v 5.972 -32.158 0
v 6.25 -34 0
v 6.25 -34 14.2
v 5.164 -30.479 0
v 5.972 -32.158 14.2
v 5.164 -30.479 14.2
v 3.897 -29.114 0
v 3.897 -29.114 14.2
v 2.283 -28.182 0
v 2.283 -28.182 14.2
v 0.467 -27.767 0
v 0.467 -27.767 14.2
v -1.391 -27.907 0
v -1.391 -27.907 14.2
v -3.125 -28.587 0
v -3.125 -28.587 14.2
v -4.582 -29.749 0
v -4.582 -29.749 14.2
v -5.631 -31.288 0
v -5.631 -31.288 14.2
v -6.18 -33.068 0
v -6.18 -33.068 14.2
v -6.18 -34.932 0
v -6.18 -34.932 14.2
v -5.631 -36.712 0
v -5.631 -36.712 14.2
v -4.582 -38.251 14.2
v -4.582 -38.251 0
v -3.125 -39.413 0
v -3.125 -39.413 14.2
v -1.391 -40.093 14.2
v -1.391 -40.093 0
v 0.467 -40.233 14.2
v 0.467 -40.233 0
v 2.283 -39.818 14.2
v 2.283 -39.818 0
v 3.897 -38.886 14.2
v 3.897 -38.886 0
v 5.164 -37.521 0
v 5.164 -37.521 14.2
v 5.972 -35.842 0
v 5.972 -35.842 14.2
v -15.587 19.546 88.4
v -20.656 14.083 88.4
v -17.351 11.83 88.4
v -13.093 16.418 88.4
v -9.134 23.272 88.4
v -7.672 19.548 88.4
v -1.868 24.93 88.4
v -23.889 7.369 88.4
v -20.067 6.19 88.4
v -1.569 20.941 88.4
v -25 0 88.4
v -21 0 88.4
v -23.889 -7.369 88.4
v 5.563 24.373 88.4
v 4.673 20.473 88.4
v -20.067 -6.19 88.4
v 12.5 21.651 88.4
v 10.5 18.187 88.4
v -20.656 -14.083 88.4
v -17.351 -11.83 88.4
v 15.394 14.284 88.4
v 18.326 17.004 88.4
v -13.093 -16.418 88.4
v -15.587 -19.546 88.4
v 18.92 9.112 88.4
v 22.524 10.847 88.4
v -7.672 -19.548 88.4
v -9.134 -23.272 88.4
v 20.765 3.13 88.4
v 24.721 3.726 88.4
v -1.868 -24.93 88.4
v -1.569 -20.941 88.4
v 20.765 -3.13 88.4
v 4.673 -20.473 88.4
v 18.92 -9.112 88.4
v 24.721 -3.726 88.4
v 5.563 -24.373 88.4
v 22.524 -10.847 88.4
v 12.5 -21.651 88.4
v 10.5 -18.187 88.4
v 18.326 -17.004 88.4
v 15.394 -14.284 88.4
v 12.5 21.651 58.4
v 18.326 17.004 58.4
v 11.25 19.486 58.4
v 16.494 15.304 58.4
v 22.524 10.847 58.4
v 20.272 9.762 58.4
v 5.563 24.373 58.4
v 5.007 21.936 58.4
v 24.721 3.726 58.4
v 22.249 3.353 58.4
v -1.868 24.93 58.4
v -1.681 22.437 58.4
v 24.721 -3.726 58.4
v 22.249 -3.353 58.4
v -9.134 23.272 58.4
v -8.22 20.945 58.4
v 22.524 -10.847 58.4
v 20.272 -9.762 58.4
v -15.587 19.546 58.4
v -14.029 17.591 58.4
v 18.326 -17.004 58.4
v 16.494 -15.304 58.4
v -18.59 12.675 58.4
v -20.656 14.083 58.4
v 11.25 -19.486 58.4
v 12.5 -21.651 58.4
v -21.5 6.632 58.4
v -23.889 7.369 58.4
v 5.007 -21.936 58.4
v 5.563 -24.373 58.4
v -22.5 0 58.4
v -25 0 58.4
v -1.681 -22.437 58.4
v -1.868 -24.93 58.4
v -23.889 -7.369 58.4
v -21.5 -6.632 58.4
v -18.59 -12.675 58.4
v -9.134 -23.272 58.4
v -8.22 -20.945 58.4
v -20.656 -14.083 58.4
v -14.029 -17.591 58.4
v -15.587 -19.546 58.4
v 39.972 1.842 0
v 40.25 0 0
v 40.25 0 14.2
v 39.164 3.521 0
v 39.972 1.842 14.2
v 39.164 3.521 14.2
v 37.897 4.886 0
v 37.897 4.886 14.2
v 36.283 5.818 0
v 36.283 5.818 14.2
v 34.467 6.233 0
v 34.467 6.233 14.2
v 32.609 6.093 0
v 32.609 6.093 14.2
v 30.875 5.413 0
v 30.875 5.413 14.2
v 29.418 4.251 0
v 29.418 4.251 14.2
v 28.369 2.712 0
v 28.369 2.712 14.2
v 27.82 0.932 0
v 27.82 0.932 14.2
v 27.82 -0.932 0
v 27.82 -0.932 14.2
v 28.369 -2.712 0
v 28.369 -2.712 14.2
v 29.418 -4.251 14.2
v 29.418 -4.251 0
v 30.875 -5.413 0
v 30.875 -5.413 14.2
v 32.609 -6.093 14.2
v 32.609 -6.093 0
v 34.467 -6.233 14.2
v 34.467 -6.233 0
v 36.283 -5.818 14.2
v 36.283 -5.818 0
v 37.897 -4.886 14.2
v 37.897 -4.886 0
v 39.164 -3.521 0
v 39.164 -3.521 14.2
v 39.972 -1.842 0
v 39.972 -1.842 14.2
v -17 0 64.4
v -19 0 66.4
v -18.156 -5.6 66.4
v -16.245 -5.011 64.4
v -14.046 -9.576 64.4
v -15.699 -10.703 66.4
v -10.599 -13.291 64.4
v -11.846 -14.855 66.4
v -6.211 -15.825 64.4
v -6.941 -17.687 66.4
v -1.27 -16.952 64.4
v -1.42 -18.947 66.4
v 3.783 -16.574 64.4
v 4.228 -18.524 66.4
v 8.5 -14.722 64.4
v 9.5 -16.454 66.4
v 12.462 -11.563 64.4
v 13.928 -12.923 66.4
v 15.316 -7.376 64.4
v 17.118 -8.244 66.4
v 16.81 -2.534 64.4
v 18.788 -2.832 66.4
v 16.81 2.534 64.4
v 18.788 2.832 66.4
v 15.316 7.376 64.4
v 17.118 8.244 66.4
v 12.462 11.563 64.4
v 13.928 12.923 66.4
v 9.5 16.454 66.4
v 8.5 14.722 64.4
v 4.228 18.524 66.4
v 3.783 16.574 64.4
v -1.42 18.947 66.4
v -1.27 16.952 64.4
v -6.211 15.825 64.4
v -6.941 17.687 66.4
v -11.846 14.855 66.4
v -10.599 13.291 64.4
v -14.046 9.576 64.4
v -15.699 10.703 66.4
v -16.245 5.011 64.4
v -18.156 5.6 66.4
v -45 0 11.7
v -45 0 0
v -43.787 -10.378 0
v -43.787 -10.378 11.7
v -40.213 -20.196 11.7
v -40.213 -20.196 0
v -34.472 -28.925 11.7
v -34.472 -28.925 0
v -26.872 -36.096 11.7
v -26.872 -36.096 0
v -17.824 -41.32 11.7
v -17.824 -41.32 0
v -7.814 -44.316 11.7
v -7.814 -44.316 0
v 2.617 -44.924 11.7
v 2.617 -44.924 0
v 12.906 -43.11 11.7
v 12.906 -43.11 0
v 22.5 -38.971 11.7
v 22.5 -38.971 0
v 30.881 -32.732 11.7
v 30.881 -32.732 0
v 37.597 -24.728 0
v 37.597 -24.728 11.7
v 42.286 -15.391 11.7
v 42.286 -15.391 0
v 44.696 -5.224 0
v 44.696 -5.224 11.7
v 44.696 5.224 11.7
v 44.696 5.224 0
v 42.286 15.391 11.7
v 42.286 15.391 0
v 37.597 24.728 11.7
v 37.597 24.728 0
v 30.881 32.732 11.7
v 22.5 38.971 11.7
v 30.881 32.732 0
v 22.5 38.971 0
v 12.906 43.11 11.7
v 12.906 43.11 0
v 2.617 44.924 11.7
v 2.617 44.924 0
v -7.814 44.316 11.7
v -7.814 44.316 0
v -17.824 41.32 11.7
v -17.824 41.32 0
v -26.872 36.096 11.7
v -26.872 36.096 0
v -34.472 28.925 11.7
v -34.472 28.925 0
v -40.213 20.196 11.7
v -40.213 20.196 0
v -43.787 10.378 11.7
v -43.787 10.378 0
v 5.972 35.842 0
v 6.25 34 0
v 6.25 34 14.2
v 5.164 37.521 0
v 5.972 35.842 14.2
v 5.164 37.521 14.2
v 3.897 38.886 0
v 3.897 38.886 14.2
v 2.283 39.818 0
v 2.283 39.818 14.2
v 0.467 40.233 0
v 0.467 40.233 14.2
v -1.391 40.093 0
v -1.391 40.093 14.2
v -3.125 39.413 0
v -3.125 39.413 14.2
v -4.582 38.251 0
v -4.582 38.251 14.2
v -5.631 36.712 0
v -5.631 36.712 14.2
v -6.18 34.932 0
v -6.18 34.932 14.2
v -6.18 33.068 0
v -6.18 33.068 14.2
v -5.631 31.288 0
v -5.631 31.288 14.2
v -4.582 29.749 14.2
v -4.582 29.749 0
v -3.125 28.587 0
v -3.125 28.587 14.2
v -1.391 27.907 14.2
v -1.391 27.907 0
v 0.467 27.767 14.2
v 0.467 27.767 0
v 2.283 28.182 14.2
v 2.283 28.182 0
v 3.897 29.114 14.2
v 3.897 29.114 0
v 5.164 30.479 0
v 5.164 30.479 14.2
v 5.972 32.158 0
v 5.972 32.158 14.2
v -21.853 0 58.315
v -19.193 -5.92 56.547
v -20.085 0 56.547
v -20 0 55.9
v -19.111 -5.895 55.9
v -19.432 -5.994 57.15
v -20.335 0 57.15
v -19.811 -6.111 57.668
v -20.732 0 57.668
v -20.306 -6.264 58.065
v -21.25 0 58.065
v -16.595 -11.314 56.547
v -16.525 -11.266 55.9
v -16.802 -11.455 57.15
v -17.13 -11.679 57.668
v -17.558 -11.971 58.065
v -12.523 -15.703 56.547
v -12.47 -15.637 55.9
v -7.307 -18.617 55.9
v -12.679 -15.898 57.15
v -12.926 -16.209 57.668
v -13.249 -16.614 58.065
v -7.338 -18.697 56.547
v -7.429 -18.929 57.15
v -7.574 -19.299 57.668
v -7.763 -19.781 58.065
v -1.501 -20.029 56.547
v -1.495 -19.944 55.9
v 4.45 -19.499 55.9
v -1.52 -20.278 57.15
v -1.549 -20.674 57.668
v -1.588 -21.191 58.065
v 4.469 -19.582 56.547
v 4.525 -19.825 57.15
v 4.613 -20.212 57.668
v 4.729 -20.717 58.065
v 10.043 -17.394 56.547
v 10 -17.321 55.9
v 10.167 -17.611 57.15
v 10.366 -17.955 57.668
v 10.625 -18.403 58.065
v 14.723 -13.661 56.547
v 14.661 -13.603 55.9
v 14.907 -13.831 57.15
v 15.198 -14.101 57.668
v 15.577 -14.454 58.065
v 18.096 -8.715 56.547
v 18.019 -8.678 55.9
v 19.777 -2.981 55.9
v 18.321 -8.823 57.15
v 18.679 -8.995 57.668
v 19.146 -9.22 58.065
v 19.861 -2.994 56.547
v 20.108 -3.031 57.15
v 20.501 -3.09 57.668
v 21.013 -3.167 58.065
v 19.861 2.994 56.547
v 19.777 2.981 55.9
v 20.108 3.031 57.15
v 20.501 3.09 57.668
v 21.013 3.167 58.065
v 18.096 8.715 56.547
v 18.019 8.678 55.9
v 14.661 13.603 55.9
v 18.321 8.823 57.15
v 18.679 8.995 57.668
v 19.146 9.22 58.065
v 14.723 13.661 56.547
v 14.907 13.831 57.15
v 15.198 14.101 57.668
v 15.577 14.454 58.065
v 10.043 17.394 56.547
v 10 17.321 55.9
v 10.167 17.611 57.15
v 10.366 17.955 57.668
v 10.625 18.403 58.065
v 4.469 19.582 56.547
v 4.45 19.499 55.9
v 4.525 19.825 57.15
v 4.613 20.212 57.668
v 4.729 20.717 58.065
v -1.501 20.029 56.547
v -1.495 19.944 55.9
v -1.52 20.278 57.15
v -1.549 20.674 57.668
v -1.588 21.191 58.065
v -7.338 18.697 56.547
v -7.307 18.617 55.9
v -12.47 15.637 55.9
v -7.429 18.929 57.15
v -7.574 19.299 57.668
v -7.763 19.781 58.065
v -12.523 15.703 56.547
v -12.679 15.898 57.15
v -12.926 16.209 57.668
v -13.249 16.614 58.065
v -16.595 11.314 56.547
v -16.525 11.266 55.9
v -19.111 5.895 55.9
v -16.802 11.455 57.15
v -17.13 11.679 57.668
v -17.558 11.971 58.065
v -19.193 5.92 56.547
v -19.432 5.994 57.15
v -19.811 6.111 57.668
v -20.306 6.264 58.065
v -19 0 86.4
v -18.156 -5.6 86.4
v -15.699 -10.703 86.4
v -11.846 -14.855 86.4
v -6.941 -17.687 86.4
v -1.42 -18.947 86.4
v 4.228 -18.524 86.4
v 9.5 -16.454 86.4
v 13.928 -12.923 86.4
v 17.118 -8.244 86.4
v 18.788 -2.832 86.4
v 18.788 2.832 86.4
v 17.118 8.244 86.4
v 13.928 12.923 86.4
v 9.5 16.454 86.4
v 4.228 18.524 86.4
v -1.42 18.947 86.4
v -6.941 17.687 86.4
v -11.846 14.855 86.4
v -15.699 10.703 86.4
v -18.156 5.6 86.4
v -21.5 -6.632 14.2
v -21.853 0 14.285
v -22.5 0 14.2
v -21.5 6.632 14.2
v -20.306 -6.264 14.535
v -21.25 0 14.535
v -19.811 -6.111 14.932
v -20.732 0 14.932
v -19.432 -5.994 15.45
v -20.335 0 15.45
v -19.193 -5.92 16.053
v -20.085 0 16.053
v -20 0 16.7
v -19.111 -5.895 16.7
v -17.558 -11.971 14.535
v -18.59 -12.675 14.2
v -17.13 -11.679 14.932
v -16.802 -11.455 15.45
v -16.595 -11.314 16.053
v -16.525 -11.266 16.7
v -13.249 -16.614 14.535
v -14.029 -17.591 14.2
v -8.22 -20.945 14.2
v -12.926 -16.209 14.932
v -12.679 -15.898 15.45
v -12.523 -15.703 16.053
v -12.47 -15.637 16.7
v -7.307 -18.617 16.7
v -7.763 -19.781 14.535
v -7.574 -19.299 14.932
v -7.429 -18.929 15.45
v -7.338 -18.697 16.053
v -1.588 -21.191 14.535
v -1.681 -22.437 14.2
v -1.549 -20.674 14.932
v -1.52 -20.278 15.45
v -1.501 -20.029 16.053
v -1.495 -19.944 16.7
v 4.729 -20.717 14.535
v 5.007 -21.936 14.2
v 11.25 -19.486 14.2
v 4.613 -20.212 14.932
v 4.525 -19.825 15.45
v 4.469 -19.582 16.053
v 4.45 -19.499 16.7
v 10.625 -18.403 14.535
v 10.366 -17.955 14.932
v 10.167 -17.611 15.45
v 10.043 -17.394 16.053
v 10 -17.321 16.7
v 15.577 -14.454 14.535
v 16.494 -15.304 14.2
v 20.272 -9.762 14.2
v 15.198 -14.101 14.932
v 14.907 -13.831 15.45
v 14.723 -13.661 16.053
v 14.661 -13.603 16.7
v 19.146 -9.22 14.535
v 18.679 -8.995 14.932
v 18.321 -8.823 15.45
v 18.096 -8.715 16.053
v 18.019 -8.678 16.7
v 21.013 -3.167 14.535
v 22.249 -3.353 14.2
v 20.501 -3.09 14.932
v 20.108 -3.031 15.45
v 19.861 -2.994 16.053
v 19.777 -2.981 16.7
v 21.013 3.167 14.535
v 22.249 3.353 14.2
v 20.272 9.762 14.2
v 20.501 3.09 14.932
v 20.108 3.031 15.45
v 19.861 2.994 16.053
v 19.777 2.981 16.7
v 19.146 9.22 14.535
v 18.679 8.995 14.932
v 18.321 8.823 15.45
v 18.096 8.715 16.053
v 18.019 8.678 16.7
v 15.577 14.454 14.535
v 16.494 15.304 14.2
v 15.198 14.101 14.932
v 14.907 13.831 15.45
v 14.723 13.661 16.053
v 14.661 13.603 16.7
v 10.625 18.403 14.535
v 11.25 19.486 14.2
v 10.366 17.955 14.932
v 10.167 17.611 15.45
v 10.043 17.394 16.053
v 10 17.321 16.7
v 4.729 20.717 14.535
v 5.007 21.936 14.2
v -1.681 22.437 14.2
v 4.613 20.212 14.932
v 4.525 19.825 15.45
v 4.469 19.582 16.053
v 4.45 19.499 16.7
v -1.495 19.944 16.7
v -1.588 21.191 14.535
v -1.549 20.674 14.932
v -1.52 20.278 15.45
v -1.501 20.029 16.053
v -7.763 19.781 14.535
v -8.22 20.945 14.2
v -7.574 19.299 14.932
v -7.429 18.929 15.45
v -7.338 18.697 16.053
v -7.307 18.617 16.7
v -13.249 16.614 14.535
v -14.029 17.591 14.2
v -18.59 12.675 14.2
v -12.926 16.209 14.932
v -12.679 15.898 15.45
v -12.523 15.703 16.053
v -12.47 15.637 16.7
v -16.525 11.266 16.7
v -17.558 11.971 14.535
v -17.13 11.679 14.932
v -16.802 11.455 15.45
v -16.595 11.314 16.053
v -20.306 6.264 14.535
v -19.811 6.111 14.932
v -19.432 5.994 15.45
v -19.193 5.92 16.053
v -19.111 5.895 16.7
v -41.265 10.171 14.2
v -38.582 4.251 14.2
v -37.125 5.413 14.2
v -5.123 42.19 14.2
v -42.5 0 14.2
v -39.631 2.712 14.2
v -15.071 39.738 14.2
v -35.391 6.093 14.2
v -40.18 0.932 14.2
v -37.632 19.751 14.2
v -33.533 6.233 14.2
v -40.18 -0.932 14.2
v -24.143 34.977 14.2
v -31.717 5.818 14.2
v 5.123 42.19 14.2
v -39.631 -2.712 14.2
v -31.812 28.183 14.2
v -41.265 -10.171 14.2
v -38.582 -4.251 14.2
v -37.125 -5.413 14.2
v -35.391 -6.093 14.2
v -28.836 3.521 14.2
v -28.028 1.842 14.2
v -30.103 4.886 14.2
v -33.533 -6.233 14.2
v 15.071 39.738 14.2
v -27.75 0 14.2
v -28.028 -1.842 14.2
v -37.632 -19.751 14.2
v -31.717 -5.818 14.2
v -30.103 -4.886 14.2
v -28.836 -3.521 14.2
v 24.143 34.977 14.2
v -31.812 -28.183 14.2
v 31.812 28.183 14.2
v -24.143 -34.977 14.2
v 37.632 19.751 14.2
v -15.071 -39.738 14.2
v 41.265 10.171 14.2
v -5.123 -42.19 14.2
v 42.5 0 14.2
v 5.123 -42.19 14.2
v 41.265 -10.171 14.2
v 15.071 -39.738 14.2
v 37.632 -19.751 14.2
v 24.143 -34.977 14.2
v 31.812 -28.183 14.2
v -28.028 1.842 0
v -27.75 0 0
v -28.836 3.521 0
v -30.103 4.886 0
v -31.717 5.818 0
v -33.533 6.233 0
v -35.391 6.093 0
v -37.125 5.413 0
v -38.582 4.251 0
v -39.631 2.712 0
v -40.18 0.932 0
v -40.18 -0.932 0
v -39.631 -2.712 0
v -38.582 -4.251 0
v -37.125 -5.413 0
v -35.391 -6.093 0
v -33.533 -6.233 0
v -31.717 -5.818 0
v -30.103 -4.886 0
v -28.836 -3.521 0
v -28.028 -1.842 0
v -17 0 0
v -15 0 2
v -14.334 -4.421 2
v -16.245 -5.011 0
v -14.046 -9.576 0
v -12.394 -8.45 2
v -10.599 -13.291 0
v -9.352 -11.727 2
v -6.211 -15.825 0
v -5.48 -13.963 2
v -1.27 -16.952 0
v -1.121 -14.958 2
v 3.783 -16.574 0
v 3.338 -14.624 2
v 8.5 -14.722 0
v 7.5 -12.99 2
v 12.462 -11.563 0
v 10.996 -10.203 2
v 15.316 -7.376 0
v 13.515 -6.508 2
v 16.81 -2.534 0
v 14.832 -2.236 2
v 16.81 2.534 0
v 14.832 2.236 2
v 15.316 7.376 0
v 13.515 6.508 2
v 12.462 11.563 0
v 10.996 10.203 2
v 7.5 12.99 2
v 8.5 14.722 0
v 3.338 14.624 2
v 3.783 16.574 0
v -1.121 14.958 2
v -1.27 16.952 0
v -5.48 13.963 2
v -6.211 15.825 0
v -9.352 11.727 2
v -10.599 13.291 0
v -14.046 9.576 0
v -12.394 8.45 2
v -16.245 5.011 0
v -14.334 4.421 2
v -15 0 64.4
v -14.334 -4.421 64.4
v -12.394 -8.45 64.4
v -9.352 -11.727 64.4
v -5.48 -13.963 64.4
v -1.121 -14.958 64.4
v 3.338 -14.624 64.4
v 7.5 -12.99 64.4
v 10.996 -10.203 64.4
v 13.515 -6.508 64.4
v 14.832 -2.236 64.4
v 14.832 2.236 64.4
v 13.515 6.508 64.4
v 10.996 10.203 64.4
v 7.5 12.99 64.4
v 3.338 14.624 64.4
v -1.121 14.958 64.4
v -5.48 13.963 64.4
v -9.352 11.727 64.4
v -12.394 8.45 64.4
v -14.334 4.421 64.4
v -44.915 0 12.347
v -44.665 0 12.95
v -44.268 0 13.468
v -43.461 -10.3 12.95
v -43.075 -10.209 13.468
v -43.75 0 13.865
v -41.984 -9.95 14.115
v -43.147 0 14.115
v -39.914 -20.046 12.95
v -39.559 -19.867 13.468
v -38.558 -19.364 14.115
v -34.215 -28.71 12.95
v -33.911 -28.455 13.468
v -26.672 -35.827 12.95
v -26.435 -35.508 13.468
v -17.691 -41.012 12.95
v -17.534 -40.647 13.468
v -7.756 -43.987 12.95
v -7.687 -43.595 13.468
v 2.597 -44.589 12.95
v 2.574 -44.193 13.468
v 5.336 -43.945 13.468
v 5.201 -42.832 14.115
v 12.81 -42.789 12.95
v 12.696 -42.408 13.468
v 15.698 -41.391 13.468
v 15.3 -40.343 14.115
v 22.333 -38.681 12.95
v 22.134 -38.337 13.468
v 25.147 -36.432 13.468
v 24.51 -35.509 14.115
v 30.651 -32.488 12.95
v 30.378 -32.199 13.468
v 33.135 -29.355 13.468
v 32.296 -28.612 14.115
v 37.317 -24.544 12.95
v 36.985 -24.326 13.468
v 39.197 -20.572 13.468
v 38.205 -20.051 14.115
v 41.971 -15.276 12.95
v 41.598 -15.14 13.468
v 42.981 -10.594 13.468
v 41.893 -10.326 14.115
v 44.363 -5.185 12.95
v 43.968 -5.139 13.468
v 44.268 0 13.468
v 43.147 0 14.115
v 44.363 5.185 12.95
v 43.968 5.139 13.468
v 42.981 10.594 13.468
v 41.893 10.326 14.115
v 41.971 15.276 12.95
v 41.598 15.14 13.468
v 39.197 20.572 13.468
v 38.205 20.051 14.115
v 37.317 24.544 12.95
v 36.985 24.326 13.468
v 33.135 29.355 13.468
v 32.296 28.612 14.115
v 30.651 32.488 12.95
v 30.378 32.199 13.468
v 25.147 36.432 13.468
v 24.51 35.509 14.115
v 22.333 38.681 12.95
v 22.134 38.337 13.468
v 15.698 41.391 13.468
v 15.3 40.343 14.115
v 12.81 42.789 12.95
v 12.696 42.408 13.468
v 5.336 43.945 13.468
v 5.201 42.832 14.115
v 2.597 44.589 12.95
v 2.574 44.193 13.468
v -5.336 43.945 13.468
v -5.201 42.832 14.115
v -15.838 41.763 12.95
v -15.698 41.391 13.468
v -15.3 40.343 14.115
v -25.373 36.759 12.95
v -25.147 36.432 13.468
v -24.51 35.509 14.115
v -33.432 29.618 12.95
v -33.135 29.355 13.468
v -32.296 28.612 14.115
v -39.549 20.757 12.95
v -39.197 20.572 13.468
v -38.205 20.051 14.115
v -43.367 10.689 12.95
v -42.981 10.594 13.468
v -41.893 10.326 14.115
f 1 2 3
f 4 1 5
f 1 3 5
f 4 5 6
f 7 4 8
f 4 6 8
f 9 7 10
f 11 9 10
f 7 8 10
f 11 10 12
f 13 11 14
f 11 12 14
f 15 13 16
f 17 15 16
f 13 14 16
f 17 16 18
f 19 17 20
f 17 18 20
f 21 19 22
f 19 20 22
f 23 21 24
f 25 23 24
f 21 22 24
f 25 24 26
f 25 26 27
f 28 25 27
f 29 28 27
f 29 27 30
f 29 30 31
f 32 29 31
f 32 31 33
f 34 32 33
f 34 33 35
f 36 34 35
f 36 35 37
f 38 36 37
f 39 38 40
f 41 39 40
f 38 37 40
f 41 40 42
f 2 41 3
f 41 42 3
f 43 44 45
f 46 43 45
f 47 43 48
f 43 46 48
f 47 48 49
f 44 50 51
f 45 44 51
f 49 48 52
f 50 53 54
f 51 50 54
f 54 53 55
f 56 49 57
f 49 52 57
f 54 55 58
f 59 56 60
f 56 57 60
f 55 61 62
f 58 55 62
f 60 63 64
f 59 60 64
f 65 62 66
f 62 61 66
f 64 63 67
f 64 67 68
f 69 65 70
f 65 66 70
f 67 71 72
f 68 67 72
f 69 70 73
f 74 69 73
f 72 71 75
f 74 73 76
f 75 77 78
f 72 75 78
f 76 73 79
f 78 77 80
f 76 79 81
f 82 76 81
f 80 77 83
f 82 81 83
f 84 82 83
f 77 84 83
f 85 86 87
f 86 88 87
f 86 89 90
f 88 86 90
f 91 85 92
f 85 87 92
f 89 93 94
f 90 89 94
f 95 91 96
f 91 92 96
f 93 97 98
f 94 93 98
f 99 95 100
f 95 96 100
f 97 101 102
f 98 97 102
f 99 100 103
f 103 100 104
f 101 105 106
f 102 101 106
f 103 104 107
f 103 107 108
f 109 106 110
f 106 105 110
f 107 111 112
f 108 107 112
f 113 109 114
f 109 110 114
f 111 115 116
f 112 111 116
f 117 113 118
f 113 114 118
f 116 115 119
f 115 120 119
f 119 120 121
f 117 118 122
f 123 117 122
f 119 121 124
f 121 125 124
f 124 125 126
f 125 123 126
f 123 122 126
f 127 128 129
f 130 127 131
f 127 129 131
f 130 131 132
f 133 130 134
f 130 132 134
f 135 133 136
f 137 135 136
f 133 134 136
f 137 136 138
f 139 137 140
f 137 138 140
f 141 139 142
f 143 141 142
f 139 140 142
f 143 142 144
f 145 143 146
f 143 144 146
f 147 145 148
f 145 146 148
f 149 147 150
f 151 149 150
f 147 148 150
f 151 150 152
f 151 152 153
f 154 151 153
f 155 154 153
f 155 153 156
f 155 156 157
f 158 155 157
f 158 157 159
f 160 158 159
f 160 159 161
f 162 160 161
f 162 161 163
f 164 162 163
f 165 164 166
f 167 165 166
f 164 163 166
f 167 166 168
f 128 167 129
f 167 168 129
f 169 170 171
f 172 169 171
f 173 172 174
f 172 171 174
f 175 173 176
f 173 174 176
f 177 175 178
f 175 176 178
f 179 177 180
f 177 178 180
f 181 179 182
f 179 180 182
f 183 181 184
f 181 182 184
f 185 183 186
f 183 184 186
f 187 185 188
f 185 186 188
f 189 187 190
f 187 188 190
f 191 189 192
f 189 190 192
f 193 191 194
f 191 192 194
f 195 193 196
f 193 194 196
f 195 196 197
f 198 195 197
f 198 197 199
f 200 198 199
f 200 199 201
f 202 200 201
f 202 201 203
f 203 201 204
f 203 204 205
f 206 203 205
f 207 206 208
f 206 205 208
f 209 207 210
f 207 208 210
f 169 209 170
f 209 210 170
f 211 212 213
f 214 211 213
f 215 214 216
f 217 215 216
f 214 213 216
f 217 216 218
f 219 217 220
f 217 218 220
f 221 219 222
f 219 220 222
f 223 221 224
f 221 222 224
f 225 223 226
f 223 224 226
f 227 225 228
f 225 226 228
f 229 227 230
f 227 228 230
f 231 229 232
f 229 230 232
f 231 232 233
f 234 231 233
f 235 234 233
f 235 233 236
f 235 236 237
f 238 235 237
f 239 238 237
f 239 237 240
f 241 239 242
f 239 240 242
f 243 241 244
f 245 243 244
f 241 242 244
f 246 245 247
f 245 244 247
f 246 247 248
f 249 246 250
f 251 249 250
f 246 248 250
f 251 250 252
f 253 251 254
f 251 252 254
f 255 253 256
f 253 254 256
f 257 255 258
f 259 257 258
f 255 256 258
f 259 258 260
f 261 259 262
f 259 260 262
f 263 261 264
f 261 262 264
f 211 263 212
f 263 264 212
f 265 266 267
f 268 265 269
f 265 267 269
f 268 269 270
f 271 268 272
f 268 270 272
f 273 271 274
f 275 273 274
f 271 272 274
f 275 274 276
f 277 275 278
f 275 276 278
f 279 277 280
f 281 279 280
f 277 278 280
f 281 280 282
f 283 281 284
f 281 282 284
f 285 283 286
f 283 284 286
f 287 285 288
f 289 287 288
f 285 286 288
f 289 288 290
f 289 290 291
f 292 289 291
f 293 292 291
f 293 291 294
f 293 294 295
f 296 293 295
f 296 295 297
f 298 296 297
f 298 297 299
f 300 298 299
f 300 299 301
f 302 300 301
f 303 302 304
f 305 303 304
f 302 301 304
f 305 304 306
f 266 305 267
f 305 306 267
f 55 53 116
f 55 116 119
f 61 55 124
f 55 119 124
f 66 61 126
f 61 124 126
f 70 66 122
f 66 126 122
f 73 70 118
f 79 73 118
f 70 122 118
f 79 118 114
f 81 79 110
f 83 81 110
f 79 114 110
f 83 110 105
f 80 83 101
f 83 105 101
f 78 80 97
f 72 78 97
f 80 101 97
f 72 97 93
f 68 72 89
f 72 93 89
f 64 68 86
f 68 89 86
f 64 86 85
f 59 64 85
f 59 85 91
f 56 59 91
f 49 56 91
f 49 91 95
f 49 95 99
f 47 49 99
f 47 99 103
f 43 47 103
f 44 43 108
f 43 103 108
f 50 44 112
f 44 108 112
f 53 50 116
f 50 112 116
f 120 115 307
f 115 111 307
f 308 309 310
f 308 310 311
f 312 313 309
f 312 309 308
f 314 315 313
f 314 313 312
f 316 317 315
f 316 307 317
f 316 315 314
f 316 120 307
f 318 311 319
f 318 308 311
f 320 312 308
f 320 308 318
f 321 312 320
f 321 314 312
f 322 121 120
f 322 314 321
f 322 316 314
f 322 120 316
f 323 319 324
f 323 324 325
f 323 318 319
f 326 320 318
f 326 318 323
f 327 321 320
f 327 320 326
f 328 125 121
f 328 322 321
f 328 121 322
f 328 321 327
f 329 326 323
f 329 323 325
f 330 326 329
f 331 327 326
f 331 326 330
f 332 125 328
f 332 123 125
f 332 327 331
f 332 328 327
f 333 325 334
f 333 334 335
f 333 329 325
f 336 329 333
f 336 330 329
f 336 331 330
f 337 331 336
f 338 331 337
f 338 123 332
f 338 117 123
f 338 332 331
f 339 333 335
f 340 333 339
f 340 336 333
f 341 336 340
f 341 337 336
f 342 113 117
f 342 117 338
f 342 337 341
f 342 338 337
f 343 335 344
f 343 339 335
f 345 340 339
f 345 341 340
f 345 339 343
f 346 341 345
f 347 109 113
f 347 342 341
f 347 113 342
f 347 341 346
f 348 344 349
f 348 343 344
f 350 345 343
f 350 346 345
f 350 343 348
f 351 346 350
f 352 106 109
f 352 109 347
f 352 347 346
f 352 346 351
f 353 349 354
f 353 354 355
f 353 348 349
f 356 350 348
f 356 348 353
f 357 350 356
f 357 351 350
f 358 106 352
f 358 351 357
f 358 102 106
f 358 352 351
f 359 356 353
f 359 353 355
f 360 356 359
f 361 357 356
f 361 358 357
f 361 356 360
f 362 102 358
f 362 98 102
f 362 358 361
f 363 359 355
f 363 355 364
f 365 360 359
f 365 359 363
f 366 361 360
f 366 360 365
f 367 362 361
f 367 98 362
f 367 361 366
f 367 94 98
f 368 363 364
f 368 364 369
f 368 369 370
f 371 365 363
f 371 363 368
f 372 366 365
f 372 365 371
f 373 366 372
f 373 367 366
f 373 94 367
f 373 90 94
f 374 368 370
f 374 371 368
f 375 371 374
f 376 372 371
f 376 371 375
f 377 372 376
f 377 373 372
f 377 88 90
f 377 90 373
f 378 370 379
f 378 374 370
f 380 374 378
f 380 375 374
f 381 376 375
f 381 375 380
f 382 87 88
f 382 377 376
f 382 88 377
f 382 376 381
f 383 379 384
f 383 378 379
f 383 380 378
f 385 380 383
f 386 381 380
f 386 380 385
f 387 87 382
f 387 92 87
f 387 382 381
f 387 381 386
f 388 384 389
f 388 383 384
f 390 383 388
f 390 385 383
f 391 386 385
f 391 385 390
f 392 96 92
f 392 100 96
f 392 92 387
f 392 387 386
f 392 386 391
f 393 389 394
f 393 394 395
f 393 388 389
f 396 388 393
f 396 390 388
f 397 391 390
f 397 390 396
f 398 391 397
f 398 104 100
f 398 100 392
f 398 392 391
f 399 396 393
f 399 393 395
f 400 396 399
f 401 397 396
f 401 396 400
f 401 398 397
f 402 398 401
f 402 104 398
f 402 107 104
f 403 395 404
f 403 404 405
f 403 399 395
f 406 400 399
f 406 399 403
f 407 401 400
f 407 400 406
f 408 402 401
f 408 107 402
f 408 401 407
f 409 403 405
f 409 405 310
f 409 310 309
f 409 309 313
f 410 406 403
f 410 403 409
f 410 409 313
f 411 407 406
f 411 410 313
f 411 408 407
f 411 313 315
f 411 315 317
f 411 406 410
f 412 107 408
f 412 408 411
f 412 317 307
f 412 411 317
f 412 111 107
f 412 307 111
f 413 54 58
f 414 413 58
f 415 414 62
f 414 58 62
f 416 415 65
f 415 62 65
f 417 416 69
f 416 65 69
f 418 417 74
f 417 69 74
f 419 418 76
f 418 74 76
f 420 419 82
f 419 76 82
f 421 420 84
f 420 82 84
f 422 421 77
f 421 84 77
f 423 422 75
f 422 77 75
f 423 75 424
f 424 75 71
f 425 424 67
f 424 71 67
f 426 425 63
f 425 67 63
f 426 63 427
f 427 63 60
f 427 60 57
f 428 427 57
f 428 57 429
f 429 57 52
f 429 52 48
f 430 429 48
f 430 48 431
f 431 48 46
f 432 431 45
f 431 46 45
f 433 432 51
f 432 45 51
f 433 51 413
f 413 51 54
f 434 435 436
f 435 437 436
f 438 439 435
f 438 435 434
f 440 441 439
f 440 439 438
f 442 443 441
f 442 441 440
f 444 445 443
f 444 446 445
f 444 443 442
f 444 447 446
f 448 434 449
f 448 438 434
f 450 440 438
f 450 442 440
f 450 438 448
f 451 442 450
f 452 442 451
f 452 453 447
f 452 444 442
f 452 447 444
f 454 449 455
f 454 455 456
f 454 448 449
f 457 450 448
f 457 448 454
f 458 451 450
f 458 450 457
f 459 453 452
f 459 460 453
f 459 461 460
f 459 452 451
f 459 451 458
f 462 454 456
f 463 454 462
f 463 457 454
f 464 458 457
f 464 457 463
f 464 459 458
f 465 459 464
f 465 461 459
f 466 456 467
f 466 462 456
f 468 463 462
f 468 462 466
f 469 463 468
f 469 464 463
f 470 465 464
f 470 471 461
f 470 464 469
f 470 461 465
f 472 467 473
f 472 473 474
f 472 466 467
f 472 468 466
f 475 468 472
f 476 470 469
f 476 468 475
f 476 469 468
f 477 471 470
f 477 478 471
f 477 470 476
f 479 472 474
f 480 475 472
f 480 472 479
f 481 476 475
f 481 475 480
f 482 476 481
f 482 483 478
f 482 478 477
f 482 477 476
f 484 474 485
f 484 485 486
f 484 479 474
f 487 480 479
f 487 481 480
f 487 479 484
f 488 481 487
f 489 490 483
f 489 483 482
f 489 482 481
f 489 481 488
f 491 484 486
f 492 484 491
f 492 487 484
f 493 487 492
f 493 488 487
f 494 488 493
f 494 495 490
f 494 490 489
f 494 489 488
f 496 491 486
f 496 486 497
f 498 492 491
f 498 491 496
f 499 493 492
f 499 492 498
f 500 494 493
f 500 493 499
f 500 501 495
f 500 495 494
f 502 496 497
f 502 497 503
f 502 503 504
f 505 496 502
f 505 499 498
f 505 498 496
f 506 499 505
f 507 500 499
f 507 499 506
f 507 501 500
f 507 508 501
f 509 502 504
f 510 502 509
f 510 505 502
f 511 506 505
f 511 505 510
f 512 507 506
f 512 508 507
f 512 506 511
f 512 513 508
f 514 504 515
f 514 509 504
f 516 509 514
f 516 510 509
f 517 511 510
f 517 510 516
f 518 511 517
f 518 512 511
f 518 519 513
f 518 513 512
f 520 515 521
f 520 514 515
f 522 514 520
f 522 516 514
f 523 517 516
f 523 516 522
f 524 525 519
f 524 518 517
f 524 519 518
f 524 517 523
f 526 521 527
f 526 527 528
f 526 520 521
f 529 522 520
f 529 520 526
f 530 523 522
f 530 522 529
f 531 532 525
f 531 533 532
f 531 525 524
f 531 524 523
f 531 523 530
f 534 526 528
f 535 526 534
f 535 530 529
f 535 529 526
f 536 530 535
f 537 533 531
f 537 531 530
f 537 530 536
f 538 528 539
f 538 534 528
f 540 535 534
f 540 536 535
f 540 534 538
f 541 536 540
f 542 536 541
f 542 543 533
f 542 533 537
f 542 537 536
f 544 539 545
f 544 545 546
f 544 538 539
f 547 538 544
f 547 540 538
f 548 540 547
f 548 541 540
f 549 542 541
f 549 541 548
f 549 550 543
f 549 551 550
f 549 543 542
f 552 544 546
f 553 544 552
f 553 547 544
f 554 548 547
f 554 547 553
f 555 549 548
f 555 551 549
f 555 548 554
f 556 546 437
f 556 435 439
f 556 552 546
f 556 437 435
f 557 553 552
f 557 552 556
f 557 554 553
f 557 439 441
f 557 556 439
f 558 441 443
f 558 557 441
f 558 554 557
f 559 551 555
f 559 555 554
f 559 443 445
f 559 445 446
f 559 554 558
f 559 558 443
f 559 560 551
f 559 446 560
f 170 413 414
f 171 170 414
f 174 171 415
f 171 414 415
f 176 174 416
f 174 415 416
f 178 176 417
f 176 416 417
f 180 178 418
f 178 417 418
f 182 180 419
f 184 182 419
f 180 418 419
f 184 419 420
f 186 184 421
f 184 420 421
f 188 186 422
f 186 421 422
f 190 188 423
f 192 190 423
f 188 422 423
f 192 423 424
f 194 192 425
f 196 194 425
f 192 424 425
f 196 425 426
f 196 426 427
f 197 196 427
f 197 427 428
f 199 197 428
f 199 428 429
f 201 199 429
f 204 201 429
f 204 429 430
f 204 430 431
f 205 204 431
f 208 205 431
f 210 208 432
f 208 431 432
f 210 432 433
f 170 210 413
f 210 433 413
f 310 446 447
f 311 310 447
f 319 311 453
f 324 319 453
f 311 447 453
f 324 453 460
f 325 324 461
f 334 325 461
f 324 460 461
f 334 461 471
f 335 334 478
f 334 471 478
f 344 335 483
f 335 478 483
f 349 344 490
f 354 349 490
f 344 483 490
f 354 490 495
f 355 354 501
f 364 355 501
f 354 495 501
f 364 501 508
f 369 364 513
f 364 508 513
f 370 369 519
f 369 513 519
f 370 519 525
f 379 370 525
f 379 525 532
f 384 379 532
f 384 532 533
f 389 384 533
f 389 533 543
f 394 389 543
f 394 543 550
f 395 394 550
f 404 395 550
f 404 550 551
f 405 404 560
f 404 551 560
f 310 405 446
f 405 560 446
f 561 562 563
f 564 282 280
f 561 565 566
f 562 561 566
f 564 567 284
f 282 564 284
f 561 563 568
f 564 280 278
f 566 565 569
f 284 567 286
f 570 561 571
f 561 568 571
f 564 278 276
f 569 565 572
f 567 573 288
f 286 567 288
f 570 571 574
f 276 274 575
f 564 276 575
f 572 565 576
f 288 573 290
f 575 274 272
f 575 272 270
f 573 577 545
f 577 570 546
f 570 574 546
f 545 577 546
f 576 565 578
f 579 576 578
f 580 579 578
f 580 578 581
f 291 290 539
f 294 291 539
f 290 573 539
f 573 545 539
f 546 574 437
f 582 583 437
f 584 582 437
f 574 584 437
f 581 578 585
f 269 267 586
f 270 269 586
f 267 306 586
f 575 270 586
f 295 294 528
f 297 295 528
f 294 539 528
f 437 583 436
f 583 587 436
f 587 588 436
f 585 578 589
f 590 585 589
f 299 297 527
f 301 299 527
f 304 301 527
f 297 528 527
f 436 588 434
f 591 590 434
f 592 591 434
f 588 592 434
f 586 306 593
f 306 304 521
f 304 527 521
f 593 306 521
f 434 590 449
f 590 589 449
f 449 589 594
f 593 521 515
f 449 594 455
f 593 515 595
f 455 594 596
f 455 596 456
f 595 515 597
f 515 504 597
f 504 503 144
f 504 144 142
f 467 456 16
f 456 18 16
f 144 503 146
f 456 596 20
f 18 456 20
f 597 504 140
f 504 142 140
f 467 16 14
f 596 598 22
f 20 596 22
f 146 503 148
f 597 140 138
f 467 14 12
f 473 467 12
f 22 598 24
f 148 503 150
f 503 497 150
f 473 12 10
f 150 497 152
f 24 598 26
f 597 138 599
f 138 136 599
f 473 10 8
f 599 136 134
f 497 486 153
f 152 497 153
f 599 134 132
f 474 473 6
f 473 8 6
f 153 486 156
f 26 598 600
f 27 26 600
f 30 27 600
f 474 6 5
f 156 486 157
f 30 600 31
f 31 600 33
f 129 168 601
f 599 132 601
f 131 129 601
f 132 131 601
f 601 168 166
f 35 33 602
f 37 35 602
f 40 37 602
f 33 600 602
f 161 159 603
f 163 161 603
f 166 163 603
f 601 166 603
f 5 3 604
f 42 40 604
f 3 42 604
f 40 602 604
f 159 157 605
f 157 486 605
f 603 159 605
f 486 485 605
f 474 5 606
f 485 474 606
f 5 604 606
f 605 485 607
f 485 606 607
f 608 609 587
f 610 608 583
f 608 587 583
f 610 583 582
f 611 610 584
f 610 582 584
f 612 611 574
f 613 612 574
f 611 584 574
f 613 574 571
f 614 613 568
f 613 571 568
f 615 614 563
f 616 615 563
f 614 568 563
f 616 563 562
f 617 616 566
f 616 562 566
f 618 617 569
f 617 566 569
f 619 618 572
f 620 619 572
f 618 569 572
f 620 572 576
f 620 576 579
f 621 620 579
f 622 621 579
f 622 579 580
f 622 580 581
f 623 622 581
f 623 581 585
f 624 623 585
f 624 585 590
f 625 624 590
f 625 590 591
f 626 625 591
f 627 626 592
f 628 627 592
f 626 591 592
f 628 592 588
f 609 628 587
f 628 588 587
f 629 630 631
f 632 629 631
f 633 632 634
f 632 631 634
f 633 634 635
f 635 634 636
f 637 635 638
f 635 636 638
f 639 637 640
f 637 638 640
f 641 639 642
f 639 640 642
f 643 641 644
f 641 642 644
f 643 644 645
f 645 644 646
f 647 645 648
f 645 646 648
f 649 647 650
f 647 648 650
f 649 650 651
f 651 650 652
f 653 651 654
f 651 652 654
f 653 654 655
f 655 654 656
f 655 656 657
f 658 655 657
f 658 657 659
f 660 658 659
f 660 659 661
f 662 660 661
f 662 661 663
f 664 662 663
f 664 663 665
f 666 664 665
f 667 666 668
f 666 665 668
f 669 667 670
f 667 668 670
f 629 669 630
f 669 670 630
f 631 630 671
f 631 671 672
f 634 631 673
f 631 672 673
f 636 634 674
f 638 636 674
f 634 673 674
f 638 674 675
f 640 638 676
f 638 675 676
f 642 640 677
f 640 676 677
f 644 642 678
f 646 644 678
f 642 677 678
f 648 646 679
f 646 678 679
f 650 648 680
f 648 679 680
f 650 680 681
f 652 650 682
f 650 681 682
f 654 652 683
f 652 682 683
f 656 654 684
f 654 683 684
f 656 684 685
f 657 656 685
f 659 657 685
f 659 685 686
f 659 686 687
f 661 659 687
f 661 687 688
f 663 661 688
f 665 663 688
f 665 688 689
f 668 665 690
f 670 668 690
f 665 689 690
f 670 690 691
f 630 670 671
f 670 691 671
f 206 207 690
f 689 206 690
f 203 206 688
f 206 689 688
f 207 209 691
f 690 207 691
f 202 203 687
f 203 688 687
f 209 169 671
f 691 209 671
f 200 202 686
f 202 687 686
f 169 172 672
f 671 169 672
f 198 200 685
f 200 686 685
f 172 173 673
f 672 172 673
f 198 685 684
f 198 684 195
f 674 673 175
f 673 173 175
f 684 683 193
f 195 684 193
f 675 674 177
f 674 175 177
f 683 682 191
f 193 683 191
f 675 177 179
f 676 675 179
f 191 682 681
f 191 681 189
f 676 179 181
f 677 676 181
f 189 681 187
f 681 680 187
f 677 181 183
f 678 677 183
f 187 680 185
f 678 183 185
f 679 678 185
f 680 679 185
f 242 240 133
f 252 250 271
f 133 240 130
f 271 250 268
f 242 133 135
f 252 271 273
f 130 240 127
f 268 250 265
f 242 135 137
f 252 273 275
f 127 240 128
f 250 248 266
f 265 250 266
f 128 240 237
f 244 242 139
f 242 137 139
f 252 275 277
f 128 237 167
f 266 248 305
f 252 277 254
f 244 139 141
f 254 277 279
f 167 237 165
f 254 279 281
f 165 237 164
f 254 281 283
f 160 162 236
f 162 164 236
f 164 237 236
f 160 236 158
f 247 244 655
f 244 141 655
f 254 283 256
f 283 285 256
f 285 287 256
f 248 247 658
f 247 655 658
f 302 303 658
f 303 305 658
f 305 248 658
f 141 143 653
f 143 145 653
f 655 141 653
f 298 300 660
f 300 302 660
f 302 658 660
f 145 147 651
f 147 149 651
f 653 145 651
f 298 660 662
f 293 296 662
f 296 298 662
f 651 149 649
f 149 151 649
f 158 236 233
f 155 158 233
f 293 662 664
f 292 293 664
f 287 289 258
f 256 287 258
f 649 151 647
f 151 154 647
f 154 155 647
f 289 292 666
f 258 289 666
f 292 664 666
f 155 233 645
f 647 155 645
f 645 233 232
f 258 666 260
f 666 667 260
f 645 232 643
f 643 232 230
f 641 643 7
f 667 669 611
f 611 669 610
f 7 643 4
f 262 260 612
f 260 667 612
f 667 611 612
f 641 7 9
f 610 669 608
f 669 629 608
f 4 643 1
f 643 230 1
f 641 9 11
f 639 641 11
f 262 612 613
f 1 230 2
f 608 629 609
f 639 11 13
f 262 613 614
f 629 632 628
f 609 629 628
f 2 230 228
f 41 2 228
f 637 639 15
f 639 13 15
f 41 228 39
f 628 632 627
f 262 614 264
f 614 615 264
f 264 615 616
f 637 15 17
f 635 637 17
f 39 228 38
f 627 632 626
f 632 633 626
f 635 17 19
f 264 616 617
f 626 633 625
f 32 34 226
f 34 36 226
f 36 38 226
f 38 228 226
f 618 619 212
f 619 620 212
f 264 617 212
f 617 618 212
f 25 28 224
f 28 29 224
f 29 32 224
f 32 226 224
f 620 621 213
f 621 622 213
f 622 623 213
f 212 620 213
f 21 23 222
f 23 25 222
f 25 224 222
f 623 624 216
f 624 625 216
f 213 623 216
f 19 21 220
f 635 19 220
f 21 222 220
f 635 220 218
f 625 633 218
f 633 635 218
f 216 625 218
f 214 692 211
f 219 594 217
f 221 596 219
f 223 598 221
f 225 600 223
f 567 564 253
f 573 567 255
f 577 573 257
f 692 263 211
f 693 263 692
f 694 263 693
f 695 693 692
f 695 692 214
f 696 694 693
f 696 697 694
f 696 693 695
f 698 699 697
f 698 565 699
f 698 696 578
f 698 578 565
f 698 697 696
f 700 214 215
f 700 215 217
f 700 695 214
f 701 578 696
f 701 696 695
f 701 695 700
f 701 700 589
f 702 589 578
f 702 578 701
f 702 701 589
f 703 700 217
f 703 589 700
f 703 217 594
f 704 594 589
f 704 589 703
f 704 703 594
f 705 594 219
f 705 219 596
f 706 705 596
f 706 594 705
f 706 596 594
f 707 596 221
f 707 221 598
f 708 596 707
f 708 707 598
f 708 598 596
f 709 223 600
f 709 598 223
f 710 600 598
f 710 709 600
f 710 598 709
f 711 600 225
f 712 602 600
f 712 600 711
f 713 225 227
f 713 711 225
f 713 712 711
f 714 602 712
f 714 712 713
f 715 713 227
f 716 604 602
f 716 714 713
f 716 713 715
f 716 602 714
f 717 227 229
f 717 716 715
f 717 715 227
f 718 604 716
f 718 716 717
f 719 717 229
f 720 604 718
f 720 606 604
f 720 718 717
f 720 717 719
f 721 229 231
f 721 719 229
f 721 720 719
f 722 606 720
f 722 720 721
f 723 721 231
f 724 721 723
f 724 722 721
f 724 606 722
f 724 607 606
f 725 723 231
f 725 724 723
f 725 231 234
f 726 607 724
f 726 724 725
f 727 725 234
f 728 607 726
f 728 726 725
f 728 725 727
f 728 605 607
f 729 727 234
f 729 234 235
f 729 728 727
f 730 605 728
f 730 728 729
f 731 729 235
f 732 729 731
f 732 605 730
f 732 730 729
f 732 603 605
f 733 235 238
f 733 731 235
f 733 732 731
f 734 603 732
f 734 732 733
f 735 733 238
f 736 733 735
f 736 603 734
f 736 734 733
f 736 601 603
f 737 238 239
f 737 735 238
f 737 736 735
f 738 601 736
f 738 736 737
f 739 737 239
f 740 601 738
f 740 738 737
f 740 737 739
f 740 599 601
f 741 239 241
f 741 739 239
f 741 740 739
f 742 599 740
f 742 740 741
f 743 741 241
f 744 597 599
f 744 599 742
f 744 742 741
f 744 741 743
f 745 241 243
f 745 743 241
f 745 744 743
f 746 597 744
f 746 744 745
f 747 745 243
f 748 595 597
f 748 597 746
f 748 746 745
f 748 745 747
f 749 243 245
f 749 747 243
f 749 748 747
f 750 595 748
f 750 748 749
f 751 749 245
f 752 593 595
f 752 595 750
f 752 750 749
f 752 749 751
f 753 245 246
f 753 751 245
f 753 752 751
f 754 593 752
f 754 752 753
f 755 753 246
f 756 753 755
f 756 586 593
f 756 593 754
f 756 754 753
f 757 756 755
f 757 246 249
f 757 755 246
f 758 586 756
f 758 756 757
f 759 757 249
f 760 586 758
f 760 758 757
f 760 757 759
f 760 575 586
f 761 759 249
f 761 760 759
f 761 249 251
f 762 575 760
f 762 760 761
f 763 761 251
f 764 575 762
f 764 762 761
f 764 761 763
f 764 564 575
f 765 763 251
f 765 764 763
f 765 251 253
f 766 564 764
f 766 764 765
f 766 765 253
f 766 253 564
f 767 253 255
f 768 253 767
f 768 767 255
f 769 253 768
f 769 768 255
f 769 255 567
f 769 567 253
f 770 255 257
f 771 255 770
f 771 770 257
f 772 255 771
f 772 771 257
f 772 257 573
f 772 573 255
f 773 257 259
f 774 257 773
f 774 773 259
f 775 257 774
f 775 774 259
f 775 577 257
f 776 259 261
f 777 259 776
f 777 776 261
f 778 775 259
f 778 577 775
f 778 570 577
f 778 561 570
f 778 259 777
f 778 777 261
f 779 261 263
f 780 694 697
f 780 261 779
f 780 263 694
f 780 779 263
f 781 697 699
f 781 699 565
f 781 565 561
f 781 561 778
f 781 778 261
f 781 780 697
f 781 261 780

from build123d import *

# Parameters (mm, degrees)
F2_SIZE  = 2
F3_R     = 2.5
F4_R     = 6.25
F5_DEPTH = 14.2


with BuildPart() as f1:
    # F0 (on Front) → F1 (revolve)
    with BuildSketch(Plane.XZ):
        Polygon((-20, 58.4), (-20, 14.2), (-45, 14.2), (-45, 0), (-15, 0), (-15, 64.4), (-19, 64.4), (-19, 88.4), (-25, 88.4), (-25, 58.4), align=None)
    revolve(axis=Axis((0, 0, 34.592547), (0, 0, 1)))

    # F2
    f2_edges = [f1.edges().sort_by_distance(p)[0] for p in [
        (15, 0, 0),
        (19, 0, 88.4),
        (19, 0, 64.4),
    ]]
    chamfer(f2_edges, length=F2_SIZE)

    # F3
    f3_edges = [f1.edges().sort_by_distance(p)[0] for p in [
        (20, 0, 14.2),
        (20, 0, 58.4),
        (45, 0, 14.2),
    ]]
    fillet(f3_edges, radius=F3_R)

    # F4 (on face) → F5 (cut, through all)
    with BuildSketch(Plane.XY.offset(14.2)):
        with Locations((0, 34)):
            Circle(F4_R)
        with Locations((-34, 0)):
            Circle(F4_R)
        with Locations((0, -34)):
            Circle(F4_R)
        with Locations((34, 0)):
            Circle(F4_R)
    extrude(amount=-F5_DEPTH, mode=Mode.SUBTRACT)


solid = f1.part
